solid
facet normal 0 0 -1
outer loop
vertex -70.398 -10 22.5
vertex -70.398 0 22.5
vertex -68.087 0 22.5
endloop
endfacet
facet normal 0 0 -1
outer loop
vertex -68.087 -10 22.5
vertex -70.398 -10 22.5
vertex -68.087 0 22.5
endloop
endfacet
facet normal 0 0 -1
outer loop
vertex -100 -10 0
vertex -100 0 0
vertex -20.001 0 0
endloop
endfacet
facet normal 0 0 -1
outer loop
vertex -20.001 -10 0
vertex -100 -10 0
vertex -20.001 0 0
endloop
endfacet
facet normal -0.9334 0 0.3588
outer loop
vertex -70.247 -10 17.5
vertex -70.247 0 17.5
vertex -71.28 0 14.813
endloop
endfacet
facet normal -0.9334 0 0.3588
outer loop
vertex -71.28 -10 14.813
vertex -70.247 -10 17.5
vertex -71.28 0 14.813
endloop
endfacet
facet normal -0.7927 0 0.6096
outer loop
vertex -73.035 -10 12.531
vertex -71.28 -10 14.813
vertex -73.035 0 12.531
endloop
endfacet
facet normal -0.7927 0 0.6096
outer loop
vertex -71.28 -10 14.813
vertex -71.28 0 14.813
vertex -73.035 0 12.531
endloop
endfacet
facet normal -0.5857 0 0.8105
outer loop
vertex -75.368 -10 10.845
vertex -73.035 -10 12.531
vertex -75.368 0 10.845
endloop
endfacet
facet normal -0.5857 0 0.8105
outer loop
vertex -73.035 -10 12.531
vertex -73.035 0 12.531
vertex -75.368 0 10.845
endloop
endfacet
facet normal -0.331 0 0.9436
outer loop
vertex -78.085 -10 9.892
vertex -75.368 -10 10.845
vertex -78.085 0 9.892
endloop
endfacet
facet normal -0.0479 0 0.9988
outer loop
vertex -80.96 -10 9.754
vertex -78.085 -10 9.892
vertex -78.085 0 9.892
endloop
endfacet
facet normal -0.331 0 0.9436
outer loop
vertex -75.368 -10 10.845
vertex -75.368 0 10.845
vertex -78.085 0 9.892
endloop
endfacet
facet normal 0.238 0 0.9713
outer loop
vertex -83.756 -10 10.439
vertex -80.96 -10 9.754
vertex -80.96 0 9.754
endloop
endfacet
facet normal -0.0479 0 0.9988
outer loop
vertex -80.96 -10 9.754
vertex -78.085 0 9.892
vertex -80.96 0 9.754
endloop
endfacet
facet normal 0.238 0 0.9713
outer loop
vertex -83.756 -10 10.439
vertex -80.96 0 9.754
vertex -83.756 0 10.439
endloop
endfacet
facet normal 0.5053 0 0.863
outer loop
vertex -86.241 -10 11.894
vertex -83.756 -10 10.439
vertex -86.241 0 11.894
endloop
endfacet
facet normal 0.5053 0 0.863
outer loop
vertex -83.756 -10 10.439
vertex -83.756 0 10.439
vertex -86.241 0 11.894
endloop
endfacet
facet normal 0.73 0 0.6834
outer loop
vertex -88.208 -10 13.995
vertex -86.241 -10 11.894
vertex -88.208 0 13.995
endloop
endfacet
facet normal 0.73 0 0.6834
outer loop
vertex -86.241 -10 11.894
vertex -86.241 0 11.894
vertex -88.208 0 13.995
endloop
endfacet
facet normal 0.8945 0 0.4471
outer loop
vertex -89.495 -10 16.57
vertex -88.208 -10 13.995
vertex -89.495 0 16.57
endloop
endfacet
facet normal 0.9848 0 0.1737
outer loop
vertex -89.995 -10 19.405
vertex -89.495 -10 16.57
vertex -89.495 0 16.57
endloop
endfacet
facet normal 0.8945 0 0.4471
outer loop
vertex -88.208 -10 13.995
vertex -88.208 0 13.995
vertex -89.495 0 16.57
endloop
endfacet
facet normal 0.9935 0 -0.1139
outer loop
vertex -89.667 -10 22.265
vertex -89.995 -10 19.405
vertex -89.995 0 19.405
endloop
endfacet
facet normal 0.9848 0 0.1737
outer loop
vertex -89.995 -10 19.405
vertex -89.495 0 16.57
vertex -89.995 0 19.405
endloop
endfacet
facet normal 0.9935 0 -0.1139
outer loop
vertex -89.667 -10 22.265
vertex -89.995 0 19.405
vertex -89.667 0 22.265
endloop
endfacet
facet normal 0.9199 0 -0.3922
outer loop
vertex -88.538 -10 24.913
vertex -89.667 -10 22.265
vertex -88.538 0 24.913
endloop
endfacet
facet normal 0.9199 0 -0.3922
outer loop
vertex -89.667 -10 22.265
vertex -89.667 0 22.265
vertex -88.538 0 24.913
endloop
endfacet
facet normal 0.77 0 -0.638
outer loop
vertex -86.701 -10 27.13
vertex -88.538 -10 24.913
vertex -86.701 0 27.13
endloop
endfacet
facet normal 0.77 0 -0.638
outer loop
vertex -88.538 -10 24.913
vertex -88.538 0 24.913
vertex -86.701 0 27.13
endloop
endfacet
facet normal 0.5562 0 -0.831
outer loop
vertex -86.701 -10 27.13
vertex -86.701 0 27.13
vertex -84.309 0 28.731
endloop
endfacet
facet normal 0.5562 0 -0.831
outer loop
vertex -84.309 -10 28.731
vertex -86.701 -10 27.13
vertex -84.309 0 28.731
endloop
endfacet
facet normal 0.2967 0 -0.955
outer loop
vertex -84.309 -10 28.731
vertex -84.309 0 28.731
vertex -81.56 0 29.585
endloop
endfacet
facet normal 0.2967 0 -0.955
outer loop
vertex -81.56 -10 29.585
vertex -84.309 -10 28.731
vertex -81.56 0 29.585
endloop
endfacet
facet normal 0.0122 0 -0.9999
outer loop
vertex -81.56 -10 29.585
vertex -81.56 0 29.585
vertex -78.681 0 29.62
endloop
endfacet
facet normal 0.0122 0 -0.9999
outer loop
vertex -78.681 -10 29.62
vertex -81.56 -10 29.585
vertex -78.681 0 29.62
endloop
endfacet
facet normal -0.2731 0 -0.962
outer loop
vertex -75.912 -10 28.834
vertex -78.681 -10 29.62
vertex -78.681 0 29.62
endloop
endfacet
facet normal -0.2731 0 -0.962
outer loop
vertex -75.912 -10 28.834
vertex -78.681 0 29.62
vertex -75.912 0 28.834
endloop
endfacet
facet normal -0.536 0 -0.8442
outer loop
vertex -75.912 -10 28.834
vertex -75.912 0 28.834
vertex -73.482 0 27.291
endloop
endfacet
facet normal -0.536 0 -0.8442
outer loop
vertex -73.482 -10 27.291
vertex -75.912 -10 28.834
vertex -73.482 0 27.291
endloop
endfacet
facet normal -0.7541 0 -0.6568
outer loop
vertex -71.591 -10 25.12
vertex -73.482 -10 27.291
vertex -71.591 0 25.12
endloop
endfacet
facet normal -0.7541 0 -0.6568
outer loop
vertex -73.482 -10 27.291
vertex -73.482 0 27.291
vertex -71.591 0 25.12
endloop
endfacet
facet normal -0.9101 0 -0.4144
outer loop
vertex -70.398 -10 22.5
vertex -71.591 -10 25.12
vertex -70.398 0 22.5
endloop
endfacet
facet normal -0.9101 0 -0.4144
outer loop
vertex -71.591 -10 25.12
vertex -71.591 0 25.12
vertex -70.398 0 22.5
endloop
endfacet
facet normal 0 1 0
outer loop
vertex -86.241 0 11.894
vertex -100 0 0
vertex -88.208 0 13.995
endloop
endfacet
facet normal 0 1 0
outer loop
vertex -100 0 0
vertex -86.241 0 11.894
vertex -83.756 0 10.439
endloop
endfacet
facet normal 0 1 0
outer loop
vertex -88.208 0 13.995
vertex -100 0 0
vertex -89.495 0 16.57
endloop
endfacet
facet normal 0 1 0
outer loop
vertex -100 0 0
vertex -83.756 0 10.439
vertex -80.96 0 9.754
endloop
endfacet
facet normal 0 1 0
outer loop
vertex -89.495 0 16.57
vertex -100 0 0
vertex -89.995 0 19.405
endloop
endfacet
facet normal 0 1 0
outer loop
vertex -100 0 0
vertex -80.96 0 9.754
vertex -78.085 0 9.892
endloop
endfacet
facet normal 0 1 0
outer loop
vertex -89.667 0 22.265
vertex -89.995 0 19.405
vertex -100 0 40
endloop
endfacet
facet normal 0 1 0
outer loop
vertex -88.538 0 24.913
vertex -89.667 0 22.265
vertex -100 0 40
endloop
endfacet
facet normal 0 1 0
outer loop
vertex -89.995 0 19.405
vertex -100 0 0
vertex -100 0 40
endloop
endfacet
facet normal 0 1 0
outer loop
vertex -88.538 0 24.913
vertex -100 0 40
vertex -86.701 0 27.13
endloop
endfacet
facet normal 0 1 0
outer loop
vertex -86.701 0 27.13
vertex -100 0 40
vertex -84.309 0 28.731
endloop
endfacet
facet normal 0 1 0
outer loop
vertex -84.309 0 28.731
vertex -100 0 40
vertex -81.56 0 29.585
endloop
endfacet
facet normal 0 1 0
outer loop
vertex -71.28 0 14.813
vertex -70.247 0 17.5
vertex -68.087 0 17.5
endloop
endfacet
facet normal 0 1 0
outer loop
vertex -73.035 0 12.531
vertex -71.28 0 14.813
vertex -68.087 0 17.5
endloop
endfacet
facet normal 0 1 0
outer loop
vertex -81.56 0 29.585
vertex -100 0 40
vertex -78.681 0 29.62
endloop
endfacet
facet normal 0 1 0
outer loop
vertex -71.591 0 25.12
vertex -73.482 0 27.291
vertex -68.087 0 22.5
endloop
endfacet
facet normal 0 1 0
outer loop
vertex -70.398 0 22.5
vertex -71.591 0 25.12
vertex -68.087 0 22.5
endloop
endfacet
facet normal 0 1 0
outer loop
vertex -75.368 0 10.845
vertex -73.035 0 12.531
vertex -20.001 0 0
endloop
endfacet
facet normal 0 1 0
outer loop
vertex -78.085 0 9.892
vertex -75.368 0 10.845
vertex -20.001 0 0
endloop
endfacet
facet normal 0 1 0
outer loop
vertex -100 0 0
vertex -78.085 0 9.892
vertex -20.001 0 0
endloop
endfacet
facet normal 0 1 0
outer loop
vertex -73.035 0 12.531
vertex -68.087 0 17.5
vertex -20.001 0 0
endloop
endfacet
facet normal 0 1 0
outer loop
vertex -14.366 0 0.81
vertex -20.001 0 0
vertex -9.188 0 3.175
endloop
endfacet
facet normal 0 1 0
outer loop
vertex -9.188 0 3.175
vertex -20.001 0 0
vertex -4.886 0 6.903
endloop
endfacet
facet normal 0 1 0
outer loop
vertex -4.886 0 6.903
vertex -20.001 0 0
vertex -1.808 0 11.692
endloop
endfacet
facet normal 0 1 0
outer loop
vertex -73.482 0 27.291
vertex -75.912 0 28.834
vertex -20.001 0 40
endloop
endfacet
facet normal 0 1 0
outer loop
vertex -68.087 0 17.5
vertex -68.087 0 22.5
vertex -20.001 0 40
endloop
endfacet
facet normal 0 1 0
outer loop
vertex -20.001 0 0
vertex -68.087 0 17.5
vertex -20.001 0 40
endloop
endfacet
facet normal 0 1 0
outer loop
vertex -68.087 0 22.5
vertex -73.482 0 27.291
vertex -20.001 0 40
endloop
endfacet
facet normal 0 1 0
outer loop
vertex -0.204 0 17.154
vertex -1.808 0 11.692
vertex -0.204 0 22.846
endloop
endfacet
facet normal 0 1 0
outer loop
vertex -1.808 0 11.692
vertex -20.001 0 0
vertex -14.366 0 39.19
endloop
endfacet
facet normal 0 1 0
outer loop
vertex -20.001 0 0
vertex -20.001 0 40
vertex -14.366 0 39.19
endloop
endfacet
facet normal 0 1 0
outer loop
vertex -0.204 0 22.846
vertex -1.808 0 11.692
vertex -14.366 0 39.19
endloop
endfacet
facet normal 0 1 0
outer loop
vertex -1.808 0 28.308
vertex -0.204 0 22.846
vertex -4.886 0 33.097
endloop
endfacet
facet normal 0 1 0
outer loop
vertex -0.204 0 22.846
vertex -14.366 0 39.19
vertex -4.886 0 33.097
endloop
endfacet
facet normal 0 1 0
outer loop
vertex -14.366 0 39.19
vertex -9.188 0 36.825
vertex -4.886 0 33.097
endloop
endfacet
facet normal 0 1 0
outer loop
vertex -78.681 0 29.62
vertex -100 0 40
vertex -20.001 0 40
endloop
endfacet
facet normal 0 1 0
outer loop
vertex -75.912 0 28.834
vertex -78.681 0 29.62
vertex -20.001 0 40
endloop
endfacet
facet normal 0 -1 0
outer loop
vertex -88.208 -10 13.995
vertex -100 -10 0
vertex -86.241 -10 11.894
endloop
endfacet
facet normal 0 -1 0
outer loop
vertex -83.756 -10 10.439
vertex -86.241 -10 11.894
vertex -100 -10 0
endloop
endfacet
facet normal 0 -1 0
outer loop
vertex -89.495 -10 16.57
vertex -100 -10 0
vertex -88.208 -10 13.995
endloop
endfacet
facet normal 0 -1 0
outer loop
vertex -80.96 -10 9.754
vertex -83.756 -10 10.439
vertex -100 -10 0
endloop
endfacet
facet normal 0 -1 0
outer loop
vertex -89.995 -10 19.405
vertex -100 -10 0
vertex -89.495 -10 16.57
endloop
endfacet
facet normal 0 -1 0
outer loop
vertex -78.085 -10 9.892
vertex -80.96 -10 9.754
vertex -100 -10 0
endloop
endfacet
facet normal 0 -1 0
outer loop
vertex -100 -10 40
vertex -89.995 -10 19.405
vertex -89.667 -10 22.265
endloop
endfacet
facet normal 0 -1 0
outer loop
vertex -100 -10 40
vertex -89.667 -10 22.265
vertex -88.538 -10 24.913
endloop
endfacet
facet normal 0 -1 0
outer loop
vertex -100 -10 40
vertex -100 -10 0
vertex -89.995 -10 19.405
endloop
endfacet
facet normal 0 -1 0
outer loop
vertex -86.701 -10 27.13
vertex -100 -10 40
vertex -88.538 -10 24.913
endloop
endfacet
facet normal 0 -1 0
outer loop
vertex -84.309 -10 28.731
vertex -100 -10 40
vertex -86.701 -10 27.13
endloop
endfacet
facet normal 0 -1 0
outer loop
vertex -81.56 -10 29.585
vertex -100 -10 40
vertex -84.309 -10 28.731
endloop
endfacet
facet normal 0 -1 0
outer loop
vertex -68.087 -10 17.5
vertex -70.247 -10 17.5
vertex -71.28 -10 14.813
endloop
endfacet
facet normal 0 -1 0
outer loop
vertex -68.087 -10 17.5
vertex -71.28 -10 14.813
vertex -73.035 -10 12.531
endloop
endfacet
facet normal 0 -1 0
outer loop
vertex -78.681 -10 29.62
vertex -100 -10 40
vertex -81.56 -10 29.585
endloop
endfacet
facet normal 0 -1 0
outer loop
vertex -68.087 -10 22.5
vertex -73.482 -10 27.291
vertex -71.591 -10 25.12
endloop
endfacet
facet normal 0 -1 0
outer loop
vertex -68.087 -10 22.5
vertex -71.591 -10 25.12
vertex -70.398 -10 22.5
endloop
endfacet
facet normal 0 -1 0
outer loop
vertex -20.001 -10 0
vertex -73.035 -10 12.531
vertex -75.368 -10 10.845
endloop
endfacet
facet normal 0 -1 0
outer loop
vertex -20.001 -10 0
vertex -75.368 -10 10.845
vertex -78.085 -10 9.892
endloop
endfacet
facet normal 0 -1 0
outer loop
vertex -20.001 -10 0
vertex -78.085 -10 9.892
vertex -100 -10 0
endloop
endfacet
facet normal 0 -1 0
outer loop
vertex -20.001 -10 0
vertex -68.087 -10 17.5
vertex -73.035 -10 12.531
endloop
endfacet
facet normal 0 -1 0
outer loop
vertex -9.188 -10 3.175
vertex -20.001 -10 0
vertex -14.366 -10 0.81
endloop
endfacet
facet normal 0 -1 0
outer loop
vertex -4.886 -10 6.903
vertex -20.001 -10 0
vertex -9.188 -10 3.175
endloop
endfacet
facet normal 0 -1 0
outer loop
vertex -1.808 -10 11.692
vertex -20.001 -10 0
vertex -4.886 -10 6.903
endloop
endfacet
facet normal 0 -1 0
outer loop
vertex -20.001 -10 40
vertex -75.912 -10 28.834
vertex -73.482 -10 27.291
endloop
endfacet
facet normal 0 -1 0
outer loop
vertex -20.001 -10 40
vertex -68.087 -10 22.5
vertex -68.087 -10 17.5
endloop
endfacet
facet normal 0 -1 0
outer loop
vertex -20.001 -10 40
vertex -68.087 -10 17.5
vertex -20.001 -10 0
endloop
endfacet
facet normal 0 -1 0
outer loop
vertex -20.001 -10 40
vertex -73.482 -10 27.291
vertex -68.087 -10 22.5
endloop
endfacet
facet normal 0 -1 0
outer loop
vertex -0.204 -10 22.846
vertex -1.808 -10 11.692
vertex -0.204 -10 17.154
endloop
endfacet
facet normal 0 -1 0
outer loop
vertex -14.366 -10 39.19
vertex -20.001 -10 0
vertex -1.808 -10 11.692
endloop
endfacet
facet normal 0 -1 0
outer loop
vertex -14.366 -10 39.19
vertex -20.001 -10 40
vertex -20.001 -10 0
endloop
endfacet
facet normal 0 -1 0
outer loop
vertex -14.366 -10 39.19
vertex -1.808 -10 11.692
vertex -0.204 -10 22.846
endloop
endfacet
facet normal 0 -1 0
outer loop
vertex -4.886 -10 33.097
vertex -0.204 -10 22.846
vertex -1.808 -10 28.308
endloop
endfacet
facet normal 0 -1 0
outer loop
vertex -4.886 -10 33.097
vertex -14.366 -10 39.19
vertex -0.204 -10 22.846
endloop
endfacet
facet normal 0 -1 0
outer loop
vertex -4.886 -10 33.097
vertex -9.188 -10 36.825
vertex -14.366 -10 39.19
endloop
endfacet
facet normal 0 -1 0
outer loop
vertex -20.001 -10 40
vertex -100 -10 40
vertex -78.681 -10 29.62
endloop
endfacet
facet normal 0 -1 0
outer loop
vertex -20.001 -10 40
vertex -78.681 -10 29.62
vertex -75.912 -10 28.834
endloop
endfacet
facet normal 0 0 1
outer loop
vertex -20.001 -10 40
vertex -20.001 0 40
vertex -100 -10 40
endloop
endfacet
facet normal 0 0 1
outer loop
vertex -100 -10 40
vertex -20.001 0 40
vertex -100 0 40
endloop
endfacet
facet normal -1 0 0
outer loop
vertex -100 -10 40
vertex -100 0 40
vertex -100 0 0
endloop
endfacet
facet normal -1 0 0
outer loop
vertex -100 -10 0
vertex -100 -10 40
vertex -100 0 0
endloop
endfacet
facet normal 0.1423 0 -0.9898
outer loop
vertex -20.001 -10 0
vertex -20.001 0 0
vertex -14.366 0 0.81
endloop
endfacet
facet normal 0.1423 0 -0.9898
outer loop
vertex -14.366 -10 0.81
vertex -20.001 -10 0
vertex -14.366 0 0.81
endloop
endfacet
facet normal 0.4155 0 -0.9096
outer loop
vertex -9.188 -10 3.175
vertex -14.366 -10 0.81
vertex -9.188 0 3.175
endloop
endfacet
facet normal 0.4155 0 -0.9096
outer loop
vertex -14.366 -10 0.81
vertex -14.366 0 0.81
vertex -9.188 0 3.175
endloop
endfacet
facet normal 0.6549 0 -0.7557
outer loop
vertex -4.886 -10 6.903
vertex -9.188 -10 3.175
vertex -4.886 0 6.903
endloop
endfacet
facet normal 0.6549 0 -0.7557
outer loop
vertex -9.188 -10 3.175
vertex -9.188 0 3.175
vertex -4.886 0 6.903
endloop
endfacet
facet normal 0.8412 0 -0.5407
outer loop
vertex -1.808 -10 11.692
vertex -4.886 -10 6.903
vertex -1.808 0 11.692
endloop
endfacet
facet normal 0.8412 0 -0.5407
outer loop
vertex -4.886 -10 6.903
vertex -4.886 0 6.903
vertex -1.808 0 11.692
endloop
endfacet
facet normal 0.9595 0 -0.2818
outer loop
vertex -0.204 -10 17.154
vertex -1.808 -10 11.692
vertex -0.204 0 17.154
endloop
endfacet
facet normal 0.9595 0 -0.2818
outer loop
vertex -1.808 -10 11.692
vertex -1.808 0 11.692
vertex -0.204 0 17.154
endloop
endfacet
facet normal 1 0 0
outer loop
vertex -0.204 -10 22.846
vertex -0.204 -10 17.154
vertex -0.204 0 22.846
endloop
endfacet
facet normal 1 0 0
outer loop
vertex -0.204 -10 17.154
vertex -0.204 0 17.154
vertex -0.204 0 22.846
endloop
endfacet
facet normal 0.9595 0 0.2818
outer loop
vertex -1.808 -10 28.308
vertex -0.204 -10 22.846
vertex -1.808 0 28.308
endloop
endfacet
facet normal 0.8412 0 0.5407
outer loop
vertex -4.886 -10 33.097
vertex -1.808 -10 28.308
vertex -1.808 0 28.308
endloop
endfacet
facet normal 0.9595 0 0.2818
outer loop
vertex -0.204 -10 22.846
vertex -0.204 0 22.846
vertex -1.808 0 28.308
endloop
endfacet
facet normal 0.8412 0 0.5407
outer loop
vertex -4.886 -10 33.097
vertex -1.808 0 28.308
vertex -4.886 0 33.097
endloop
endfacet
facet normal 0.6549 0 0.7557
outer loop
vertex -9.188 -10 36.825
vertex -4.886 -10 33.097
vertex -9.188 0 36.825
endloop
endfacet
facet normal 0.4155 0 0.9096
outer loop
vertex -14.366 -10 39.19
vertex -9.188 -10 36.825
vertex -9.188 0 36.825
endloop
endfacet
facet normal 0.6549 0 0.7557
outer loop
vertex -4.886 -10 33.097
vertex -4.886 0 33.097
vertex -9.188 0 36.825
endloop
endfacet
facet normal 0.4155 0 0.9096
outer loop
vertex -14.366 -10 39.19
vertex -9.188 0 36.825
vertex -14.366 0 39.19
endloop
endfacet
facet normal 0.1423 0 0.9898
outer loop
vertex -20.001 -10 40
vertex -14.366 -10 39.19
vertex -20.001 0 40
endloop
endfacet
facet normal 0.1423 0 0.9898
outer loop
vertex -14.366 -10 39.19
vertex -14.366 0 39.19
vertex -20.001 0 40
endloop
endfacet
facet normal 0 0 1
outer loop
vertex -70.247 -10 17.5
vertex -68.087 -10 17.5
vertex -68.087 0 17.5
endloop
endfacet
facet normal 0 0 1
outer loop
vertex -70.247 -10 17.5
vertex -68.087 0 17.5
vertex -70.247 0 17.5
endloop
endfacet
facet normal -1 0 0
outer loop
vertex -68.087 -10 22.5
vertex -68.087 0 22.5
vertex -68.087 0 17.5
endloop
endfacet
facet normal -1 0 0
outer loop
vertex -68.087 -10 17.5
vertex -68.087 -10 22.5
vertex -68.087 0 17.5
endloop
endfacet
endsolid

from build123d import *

# Parameters (mm, degrees)
F1_DEPTH = 10


with BuildPart() as f1:
    # F0 (on Front) → F1 (new body)
    with BuildSketch(Plane.XZ):
        with BuildLine():
            Line((-100, 0), (-20.000535, 0))
            ThreePointArc((-20.000535, 0), (-0.000535, 20), (-20.000535, 40))
            Line((-20.000535, 40), (-100, 40))
            Line((-100, 40), (-100, 0))
        make_face()
        with BuildLine():
            ThreePointArc((-70.246651, 17.5), (-89.995429, 19.404993), (-70.397874, 22.5))
            Line((-70.397874, 22.5), (-68.087297, 22.5))
            Line((-68.087297, 22.5), (-68.087297, 17.5))
            Line((-68.087297, 17.5), (-70.246651, 17.5))
        make_face(mode=Mode.SUBTRACT)
    extrude(amount=F1_DEPTH)


solid = f1.part
